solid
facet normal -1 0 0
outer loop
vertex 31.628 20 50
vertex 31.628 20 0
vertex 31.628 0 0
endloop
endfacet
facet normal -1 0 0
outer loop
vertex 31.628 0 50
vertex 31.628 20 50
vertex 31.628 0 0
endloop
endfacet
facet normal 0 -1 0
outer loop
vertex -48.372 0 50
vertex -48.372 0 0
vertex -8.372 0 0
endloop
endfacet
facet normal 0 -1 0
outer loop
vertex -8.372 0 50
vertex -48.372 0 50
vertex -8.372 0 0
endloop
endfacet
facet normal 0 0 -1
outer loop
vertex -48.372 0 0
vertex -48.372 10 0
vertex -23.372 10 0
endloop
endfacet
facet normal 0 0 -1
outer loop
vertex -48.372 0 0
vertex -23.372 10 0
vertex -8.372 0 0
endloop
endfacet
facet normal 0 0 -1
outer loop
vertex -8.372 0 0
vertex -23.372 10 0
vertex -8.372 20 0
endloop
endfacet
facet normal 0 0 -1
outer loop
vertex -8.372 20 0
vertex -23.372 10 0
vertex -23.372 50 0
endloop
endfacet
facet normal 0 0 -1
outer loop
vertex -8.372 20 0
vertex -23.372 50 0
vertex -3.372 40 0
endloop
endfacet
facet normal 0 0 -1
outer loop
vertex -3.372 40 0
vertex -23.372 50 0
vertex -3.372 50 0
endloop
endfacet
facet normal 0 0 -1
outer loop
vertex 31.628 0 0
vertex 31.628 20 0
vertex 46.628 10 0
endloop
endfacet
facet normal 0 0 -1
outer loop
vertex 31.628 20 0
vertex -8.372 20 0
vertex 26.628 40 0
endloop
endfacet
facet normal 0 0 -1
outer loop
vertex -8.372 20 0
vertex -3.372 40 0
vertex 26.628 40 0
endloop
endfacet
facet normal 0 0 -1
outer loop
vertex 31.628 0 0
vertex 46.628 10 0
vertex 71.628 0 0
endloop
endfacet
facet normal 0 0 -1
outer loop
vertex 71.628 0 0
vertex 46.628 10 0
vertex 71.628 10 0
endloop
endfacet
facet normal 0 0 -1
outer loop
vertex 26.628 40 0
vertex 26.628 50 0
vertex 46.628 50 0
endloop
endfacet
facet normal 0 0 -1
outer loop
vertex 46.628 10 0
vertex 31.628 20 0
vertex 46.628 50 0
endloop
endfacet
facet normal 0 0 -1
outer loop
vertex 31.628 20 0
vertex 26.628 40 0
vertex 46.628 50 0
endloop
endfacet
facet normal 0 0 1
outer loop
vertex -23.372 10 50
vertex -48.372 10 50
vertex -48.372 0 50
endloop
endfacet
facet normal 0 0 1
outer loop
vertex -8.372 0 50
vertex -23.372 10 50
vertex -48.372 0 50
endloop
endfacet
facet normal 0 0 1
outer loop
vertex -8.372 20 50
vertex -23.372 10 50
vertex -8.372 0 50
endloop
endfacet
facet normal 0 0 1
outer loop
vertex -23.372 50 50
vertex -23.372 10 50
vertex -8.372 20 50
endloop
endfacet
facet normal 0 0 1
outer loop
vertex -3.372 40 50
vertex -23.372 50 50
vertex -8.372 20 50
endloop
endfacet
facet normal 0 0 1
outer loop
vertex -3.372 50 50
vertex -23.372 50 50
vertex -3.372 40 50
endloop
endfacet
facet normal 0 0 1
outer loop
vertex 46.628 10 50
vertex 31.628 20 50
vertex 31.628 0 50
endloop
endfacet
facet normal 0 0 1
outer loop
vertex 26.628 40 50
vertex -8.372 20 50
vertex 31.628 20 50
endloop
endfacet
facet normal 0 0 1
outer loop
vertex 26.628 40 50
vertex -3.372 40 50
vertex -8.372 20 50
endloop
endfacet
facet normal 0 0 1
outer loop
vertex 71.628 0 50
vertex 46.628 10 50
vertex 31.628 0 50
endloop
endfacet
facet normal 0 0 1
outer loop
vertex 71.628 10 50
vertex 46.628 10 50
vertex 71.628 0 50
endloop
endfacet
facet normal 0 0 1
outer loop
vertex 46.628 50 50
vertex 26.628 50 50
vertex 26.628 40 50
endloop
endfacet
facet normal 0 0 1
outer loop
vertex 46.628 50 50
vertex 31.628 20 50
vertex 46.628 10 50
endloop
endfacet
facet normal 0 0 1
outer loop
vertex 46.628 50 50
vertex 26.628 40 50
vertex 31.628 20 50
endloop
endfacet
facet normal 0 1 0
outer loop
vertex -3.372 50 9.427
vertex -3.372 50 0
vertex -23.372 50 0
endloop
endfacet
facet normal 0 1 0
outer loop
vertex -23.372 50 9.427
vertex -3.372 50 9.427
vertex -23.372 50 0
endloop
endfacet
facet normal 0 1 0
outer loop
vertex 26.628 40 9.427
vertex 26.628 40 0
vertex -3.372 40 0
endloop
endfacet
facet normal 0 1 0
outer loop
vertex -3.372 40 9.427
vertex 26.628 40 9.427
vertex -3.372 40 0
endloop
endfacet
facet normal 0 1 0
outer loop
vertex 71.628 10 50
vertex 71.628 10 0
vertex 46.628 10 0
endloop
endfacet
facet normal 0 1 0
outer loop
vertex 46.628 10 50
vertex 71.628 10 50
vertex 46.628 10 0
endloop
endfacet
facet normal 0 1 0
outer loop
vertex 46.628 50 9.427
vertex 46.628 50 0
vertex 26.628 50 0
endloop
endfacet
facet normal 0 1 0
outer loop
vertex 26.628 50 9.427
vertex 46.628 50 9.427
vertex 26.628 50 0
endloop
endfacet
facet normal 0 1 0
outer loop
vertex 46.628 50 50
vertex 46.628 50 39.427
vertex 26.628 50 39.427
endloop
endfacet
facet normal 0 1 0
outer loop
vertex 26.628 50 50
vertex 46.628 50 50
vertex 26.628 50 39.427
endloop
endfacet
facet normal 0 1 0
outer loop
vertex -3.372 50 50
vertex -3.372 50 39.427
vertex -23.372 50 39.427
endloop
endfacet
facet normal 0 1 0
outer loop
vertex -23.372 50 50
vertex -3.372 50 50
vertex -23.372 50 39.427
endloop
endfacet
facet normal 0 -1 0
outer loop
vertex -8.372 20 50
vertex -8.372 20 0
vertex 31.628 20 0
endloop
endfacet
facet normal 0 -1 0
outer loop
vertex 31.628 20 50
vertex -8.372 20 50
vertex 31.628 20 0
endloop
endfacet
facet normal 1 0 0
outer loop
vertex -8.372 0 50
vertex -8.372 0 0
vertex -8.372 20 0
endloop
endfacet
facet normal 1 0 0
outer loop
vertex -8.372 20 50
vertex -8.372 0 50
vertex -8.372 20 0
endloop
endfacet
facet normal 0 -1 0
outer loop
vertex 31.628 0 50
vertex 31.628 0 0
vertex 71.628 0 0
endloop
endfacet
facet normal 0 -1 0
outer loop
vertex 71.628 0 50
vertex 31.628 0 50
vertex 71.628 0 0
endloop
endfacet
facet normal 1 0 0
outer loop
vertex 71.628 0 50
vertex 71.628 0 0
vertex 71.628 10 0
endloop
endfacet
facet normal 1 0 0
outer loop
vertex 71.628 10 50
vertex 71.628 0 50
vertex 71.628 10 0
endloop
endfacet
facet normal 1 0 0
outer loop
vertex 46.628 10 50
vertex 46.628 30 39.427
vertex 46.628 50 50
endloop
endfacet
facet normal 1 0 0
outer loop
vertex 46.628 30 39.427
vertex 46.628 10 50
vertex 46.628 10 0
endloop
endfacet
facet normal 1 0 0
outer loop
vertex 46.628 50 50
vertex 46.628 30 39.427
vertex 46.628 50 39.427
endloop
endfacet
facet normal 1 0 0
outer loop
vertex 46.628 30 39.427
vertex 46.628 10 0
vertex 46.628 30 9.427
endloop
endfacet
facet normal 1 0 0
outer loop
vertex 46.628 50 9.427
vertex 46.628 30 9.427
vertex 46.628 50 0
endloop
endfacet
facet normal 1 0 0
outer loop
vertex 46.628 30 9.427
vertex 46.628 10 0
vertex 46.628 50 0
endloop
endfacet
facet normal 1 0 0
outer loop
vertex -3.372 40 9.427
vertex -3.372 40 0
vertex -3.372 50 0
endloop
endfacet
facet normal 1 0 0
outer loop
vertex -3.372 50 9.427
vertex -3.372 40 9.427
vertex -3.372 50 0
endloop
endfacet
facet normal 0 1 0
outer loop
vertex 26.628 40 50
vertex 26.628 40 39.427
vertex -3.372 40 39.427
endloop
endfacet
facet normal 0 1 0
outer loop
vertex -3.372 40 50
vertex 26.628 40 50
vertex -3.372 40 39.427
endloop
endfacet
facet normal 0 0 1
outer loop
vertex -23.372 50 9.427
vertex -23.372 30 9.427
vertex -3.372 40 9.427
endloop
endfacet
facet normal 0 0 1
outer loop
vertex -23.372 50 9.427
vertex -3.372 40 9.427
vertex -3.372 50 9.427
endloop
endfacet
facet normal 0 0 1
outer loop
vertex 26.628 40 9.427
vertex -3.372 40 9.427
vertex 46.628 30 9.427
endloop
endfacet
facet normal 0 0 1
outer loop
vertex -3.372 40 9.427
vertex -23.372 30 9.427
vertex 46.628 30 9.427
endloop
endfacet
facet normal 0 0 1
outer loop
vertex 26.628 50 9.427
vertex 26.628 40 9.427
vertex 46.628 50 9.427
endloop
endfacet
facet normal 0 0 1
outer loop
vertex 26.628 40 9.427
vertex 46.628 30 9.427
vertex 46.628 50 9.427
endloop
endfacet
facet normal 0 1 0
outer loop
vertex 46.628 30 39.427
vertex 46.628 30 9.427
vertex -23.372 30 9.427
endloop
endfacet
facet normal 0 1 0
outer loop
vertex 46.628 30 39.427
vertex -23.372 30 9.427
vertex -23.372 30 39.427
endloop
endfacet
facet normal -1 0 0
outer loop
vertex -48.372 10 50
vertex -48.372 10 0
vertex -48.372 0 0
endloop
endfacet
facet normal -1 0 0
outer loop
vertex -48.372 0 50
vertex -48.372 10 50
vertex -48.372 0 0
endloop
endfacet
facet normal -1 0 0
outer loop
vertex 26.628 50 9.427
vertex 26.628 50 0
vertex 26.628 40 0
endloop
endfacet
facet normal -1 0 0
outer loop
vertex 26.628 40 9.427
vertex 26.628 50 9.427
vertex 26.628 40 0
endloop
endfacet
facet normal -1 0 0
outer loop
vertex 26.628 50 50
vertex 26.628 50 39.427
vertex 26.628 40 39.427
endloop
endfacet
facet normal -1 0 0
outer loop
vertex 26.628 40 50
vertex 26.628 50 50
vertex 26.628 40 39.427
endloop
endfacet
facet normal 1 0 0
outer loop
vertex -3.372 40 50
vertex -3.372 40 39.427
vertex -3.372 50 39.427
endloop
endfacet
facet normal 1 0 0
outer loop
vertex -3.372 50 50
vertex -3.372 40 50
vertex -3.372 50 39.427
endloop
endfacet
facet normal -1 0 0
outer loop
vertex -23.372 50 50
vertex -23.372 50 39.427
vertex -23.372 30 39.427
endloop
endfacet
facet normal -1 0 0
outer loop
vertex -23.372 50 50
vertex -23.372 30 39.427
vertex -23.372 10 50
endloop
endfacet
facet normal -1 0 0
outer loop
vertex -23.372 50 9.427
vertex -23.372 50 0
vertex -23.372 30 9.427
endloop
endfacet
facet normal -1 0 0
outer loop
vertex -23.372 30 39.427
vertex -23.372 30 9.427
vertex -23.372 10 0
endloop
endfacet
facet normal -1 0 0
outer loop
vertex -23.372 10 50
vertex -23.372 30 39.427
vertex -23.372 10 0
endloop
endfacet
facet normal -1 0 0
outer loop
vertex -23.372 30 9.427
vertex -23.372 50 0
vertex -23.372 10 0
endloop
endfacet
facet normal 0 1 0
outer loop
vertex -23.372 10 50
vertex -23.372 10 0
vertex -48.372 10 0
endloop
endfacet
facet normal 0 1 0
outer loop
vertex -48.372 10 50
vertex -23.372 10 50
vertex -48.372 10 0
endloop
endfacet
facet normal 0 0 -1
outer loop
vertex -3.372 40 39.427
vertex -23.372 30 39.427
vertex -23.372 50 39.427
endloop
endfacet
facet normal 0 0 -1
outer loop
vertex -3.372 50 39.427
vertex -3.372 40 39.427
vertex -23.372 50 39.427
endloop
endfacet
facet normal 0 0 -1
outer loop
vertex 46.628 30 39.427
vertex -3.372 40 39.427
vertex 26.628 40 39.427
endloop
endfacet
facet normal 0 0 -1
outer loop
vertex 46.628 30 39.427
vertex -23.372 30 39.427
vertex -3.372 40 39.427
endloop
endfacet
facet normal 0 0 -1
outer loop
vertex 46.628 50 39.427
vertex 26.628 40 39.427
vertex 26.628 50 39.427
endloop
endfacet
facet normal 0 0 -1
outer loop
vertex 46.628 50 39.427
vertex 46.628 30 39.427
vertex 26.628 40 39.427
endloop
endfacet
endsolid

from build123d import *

# Parameters (mm, degrees)
F1_DEPTH = 50
F2_W     = 19.9999988079
F2_H     = 30
F3_DEPTH = 70


with BuildPart() as f1:
    # F0 (on Top) → F1 (new body)
    with BuildSketch(Plane.XY):
        Polygon((-48.3720720015, 10), (-48.3720720015, 0), (-8.3720720015, 0), (-8.3720720015, 20), (31.6279279985, 20), (31.6279279985, 0), (71.6279279985, 0), (71.6279279985, 10), (46.6279279985, 10), (46.6279279985, 50), (26.6279279985, 50), (26.6279279985, 40), (-3.3720720015, 40), (-3.3720720015, 50), (-23.3720720015, 50), (-23.3720720015, 10), align=None)
    extrude(amount=F1_DEPTH)

    # F2 (on face) → F3 (cut)
    with BuildSketch(Plane.YZ.offset(46.6279279985)):
        with Locations((40.000000596, 24.4267614186)):
            Rectangle(F2_W, F2_H)
    extrude(amount=-F3_DEPTH, mode=Mode.SUBTRACT)


solid = f1.part
